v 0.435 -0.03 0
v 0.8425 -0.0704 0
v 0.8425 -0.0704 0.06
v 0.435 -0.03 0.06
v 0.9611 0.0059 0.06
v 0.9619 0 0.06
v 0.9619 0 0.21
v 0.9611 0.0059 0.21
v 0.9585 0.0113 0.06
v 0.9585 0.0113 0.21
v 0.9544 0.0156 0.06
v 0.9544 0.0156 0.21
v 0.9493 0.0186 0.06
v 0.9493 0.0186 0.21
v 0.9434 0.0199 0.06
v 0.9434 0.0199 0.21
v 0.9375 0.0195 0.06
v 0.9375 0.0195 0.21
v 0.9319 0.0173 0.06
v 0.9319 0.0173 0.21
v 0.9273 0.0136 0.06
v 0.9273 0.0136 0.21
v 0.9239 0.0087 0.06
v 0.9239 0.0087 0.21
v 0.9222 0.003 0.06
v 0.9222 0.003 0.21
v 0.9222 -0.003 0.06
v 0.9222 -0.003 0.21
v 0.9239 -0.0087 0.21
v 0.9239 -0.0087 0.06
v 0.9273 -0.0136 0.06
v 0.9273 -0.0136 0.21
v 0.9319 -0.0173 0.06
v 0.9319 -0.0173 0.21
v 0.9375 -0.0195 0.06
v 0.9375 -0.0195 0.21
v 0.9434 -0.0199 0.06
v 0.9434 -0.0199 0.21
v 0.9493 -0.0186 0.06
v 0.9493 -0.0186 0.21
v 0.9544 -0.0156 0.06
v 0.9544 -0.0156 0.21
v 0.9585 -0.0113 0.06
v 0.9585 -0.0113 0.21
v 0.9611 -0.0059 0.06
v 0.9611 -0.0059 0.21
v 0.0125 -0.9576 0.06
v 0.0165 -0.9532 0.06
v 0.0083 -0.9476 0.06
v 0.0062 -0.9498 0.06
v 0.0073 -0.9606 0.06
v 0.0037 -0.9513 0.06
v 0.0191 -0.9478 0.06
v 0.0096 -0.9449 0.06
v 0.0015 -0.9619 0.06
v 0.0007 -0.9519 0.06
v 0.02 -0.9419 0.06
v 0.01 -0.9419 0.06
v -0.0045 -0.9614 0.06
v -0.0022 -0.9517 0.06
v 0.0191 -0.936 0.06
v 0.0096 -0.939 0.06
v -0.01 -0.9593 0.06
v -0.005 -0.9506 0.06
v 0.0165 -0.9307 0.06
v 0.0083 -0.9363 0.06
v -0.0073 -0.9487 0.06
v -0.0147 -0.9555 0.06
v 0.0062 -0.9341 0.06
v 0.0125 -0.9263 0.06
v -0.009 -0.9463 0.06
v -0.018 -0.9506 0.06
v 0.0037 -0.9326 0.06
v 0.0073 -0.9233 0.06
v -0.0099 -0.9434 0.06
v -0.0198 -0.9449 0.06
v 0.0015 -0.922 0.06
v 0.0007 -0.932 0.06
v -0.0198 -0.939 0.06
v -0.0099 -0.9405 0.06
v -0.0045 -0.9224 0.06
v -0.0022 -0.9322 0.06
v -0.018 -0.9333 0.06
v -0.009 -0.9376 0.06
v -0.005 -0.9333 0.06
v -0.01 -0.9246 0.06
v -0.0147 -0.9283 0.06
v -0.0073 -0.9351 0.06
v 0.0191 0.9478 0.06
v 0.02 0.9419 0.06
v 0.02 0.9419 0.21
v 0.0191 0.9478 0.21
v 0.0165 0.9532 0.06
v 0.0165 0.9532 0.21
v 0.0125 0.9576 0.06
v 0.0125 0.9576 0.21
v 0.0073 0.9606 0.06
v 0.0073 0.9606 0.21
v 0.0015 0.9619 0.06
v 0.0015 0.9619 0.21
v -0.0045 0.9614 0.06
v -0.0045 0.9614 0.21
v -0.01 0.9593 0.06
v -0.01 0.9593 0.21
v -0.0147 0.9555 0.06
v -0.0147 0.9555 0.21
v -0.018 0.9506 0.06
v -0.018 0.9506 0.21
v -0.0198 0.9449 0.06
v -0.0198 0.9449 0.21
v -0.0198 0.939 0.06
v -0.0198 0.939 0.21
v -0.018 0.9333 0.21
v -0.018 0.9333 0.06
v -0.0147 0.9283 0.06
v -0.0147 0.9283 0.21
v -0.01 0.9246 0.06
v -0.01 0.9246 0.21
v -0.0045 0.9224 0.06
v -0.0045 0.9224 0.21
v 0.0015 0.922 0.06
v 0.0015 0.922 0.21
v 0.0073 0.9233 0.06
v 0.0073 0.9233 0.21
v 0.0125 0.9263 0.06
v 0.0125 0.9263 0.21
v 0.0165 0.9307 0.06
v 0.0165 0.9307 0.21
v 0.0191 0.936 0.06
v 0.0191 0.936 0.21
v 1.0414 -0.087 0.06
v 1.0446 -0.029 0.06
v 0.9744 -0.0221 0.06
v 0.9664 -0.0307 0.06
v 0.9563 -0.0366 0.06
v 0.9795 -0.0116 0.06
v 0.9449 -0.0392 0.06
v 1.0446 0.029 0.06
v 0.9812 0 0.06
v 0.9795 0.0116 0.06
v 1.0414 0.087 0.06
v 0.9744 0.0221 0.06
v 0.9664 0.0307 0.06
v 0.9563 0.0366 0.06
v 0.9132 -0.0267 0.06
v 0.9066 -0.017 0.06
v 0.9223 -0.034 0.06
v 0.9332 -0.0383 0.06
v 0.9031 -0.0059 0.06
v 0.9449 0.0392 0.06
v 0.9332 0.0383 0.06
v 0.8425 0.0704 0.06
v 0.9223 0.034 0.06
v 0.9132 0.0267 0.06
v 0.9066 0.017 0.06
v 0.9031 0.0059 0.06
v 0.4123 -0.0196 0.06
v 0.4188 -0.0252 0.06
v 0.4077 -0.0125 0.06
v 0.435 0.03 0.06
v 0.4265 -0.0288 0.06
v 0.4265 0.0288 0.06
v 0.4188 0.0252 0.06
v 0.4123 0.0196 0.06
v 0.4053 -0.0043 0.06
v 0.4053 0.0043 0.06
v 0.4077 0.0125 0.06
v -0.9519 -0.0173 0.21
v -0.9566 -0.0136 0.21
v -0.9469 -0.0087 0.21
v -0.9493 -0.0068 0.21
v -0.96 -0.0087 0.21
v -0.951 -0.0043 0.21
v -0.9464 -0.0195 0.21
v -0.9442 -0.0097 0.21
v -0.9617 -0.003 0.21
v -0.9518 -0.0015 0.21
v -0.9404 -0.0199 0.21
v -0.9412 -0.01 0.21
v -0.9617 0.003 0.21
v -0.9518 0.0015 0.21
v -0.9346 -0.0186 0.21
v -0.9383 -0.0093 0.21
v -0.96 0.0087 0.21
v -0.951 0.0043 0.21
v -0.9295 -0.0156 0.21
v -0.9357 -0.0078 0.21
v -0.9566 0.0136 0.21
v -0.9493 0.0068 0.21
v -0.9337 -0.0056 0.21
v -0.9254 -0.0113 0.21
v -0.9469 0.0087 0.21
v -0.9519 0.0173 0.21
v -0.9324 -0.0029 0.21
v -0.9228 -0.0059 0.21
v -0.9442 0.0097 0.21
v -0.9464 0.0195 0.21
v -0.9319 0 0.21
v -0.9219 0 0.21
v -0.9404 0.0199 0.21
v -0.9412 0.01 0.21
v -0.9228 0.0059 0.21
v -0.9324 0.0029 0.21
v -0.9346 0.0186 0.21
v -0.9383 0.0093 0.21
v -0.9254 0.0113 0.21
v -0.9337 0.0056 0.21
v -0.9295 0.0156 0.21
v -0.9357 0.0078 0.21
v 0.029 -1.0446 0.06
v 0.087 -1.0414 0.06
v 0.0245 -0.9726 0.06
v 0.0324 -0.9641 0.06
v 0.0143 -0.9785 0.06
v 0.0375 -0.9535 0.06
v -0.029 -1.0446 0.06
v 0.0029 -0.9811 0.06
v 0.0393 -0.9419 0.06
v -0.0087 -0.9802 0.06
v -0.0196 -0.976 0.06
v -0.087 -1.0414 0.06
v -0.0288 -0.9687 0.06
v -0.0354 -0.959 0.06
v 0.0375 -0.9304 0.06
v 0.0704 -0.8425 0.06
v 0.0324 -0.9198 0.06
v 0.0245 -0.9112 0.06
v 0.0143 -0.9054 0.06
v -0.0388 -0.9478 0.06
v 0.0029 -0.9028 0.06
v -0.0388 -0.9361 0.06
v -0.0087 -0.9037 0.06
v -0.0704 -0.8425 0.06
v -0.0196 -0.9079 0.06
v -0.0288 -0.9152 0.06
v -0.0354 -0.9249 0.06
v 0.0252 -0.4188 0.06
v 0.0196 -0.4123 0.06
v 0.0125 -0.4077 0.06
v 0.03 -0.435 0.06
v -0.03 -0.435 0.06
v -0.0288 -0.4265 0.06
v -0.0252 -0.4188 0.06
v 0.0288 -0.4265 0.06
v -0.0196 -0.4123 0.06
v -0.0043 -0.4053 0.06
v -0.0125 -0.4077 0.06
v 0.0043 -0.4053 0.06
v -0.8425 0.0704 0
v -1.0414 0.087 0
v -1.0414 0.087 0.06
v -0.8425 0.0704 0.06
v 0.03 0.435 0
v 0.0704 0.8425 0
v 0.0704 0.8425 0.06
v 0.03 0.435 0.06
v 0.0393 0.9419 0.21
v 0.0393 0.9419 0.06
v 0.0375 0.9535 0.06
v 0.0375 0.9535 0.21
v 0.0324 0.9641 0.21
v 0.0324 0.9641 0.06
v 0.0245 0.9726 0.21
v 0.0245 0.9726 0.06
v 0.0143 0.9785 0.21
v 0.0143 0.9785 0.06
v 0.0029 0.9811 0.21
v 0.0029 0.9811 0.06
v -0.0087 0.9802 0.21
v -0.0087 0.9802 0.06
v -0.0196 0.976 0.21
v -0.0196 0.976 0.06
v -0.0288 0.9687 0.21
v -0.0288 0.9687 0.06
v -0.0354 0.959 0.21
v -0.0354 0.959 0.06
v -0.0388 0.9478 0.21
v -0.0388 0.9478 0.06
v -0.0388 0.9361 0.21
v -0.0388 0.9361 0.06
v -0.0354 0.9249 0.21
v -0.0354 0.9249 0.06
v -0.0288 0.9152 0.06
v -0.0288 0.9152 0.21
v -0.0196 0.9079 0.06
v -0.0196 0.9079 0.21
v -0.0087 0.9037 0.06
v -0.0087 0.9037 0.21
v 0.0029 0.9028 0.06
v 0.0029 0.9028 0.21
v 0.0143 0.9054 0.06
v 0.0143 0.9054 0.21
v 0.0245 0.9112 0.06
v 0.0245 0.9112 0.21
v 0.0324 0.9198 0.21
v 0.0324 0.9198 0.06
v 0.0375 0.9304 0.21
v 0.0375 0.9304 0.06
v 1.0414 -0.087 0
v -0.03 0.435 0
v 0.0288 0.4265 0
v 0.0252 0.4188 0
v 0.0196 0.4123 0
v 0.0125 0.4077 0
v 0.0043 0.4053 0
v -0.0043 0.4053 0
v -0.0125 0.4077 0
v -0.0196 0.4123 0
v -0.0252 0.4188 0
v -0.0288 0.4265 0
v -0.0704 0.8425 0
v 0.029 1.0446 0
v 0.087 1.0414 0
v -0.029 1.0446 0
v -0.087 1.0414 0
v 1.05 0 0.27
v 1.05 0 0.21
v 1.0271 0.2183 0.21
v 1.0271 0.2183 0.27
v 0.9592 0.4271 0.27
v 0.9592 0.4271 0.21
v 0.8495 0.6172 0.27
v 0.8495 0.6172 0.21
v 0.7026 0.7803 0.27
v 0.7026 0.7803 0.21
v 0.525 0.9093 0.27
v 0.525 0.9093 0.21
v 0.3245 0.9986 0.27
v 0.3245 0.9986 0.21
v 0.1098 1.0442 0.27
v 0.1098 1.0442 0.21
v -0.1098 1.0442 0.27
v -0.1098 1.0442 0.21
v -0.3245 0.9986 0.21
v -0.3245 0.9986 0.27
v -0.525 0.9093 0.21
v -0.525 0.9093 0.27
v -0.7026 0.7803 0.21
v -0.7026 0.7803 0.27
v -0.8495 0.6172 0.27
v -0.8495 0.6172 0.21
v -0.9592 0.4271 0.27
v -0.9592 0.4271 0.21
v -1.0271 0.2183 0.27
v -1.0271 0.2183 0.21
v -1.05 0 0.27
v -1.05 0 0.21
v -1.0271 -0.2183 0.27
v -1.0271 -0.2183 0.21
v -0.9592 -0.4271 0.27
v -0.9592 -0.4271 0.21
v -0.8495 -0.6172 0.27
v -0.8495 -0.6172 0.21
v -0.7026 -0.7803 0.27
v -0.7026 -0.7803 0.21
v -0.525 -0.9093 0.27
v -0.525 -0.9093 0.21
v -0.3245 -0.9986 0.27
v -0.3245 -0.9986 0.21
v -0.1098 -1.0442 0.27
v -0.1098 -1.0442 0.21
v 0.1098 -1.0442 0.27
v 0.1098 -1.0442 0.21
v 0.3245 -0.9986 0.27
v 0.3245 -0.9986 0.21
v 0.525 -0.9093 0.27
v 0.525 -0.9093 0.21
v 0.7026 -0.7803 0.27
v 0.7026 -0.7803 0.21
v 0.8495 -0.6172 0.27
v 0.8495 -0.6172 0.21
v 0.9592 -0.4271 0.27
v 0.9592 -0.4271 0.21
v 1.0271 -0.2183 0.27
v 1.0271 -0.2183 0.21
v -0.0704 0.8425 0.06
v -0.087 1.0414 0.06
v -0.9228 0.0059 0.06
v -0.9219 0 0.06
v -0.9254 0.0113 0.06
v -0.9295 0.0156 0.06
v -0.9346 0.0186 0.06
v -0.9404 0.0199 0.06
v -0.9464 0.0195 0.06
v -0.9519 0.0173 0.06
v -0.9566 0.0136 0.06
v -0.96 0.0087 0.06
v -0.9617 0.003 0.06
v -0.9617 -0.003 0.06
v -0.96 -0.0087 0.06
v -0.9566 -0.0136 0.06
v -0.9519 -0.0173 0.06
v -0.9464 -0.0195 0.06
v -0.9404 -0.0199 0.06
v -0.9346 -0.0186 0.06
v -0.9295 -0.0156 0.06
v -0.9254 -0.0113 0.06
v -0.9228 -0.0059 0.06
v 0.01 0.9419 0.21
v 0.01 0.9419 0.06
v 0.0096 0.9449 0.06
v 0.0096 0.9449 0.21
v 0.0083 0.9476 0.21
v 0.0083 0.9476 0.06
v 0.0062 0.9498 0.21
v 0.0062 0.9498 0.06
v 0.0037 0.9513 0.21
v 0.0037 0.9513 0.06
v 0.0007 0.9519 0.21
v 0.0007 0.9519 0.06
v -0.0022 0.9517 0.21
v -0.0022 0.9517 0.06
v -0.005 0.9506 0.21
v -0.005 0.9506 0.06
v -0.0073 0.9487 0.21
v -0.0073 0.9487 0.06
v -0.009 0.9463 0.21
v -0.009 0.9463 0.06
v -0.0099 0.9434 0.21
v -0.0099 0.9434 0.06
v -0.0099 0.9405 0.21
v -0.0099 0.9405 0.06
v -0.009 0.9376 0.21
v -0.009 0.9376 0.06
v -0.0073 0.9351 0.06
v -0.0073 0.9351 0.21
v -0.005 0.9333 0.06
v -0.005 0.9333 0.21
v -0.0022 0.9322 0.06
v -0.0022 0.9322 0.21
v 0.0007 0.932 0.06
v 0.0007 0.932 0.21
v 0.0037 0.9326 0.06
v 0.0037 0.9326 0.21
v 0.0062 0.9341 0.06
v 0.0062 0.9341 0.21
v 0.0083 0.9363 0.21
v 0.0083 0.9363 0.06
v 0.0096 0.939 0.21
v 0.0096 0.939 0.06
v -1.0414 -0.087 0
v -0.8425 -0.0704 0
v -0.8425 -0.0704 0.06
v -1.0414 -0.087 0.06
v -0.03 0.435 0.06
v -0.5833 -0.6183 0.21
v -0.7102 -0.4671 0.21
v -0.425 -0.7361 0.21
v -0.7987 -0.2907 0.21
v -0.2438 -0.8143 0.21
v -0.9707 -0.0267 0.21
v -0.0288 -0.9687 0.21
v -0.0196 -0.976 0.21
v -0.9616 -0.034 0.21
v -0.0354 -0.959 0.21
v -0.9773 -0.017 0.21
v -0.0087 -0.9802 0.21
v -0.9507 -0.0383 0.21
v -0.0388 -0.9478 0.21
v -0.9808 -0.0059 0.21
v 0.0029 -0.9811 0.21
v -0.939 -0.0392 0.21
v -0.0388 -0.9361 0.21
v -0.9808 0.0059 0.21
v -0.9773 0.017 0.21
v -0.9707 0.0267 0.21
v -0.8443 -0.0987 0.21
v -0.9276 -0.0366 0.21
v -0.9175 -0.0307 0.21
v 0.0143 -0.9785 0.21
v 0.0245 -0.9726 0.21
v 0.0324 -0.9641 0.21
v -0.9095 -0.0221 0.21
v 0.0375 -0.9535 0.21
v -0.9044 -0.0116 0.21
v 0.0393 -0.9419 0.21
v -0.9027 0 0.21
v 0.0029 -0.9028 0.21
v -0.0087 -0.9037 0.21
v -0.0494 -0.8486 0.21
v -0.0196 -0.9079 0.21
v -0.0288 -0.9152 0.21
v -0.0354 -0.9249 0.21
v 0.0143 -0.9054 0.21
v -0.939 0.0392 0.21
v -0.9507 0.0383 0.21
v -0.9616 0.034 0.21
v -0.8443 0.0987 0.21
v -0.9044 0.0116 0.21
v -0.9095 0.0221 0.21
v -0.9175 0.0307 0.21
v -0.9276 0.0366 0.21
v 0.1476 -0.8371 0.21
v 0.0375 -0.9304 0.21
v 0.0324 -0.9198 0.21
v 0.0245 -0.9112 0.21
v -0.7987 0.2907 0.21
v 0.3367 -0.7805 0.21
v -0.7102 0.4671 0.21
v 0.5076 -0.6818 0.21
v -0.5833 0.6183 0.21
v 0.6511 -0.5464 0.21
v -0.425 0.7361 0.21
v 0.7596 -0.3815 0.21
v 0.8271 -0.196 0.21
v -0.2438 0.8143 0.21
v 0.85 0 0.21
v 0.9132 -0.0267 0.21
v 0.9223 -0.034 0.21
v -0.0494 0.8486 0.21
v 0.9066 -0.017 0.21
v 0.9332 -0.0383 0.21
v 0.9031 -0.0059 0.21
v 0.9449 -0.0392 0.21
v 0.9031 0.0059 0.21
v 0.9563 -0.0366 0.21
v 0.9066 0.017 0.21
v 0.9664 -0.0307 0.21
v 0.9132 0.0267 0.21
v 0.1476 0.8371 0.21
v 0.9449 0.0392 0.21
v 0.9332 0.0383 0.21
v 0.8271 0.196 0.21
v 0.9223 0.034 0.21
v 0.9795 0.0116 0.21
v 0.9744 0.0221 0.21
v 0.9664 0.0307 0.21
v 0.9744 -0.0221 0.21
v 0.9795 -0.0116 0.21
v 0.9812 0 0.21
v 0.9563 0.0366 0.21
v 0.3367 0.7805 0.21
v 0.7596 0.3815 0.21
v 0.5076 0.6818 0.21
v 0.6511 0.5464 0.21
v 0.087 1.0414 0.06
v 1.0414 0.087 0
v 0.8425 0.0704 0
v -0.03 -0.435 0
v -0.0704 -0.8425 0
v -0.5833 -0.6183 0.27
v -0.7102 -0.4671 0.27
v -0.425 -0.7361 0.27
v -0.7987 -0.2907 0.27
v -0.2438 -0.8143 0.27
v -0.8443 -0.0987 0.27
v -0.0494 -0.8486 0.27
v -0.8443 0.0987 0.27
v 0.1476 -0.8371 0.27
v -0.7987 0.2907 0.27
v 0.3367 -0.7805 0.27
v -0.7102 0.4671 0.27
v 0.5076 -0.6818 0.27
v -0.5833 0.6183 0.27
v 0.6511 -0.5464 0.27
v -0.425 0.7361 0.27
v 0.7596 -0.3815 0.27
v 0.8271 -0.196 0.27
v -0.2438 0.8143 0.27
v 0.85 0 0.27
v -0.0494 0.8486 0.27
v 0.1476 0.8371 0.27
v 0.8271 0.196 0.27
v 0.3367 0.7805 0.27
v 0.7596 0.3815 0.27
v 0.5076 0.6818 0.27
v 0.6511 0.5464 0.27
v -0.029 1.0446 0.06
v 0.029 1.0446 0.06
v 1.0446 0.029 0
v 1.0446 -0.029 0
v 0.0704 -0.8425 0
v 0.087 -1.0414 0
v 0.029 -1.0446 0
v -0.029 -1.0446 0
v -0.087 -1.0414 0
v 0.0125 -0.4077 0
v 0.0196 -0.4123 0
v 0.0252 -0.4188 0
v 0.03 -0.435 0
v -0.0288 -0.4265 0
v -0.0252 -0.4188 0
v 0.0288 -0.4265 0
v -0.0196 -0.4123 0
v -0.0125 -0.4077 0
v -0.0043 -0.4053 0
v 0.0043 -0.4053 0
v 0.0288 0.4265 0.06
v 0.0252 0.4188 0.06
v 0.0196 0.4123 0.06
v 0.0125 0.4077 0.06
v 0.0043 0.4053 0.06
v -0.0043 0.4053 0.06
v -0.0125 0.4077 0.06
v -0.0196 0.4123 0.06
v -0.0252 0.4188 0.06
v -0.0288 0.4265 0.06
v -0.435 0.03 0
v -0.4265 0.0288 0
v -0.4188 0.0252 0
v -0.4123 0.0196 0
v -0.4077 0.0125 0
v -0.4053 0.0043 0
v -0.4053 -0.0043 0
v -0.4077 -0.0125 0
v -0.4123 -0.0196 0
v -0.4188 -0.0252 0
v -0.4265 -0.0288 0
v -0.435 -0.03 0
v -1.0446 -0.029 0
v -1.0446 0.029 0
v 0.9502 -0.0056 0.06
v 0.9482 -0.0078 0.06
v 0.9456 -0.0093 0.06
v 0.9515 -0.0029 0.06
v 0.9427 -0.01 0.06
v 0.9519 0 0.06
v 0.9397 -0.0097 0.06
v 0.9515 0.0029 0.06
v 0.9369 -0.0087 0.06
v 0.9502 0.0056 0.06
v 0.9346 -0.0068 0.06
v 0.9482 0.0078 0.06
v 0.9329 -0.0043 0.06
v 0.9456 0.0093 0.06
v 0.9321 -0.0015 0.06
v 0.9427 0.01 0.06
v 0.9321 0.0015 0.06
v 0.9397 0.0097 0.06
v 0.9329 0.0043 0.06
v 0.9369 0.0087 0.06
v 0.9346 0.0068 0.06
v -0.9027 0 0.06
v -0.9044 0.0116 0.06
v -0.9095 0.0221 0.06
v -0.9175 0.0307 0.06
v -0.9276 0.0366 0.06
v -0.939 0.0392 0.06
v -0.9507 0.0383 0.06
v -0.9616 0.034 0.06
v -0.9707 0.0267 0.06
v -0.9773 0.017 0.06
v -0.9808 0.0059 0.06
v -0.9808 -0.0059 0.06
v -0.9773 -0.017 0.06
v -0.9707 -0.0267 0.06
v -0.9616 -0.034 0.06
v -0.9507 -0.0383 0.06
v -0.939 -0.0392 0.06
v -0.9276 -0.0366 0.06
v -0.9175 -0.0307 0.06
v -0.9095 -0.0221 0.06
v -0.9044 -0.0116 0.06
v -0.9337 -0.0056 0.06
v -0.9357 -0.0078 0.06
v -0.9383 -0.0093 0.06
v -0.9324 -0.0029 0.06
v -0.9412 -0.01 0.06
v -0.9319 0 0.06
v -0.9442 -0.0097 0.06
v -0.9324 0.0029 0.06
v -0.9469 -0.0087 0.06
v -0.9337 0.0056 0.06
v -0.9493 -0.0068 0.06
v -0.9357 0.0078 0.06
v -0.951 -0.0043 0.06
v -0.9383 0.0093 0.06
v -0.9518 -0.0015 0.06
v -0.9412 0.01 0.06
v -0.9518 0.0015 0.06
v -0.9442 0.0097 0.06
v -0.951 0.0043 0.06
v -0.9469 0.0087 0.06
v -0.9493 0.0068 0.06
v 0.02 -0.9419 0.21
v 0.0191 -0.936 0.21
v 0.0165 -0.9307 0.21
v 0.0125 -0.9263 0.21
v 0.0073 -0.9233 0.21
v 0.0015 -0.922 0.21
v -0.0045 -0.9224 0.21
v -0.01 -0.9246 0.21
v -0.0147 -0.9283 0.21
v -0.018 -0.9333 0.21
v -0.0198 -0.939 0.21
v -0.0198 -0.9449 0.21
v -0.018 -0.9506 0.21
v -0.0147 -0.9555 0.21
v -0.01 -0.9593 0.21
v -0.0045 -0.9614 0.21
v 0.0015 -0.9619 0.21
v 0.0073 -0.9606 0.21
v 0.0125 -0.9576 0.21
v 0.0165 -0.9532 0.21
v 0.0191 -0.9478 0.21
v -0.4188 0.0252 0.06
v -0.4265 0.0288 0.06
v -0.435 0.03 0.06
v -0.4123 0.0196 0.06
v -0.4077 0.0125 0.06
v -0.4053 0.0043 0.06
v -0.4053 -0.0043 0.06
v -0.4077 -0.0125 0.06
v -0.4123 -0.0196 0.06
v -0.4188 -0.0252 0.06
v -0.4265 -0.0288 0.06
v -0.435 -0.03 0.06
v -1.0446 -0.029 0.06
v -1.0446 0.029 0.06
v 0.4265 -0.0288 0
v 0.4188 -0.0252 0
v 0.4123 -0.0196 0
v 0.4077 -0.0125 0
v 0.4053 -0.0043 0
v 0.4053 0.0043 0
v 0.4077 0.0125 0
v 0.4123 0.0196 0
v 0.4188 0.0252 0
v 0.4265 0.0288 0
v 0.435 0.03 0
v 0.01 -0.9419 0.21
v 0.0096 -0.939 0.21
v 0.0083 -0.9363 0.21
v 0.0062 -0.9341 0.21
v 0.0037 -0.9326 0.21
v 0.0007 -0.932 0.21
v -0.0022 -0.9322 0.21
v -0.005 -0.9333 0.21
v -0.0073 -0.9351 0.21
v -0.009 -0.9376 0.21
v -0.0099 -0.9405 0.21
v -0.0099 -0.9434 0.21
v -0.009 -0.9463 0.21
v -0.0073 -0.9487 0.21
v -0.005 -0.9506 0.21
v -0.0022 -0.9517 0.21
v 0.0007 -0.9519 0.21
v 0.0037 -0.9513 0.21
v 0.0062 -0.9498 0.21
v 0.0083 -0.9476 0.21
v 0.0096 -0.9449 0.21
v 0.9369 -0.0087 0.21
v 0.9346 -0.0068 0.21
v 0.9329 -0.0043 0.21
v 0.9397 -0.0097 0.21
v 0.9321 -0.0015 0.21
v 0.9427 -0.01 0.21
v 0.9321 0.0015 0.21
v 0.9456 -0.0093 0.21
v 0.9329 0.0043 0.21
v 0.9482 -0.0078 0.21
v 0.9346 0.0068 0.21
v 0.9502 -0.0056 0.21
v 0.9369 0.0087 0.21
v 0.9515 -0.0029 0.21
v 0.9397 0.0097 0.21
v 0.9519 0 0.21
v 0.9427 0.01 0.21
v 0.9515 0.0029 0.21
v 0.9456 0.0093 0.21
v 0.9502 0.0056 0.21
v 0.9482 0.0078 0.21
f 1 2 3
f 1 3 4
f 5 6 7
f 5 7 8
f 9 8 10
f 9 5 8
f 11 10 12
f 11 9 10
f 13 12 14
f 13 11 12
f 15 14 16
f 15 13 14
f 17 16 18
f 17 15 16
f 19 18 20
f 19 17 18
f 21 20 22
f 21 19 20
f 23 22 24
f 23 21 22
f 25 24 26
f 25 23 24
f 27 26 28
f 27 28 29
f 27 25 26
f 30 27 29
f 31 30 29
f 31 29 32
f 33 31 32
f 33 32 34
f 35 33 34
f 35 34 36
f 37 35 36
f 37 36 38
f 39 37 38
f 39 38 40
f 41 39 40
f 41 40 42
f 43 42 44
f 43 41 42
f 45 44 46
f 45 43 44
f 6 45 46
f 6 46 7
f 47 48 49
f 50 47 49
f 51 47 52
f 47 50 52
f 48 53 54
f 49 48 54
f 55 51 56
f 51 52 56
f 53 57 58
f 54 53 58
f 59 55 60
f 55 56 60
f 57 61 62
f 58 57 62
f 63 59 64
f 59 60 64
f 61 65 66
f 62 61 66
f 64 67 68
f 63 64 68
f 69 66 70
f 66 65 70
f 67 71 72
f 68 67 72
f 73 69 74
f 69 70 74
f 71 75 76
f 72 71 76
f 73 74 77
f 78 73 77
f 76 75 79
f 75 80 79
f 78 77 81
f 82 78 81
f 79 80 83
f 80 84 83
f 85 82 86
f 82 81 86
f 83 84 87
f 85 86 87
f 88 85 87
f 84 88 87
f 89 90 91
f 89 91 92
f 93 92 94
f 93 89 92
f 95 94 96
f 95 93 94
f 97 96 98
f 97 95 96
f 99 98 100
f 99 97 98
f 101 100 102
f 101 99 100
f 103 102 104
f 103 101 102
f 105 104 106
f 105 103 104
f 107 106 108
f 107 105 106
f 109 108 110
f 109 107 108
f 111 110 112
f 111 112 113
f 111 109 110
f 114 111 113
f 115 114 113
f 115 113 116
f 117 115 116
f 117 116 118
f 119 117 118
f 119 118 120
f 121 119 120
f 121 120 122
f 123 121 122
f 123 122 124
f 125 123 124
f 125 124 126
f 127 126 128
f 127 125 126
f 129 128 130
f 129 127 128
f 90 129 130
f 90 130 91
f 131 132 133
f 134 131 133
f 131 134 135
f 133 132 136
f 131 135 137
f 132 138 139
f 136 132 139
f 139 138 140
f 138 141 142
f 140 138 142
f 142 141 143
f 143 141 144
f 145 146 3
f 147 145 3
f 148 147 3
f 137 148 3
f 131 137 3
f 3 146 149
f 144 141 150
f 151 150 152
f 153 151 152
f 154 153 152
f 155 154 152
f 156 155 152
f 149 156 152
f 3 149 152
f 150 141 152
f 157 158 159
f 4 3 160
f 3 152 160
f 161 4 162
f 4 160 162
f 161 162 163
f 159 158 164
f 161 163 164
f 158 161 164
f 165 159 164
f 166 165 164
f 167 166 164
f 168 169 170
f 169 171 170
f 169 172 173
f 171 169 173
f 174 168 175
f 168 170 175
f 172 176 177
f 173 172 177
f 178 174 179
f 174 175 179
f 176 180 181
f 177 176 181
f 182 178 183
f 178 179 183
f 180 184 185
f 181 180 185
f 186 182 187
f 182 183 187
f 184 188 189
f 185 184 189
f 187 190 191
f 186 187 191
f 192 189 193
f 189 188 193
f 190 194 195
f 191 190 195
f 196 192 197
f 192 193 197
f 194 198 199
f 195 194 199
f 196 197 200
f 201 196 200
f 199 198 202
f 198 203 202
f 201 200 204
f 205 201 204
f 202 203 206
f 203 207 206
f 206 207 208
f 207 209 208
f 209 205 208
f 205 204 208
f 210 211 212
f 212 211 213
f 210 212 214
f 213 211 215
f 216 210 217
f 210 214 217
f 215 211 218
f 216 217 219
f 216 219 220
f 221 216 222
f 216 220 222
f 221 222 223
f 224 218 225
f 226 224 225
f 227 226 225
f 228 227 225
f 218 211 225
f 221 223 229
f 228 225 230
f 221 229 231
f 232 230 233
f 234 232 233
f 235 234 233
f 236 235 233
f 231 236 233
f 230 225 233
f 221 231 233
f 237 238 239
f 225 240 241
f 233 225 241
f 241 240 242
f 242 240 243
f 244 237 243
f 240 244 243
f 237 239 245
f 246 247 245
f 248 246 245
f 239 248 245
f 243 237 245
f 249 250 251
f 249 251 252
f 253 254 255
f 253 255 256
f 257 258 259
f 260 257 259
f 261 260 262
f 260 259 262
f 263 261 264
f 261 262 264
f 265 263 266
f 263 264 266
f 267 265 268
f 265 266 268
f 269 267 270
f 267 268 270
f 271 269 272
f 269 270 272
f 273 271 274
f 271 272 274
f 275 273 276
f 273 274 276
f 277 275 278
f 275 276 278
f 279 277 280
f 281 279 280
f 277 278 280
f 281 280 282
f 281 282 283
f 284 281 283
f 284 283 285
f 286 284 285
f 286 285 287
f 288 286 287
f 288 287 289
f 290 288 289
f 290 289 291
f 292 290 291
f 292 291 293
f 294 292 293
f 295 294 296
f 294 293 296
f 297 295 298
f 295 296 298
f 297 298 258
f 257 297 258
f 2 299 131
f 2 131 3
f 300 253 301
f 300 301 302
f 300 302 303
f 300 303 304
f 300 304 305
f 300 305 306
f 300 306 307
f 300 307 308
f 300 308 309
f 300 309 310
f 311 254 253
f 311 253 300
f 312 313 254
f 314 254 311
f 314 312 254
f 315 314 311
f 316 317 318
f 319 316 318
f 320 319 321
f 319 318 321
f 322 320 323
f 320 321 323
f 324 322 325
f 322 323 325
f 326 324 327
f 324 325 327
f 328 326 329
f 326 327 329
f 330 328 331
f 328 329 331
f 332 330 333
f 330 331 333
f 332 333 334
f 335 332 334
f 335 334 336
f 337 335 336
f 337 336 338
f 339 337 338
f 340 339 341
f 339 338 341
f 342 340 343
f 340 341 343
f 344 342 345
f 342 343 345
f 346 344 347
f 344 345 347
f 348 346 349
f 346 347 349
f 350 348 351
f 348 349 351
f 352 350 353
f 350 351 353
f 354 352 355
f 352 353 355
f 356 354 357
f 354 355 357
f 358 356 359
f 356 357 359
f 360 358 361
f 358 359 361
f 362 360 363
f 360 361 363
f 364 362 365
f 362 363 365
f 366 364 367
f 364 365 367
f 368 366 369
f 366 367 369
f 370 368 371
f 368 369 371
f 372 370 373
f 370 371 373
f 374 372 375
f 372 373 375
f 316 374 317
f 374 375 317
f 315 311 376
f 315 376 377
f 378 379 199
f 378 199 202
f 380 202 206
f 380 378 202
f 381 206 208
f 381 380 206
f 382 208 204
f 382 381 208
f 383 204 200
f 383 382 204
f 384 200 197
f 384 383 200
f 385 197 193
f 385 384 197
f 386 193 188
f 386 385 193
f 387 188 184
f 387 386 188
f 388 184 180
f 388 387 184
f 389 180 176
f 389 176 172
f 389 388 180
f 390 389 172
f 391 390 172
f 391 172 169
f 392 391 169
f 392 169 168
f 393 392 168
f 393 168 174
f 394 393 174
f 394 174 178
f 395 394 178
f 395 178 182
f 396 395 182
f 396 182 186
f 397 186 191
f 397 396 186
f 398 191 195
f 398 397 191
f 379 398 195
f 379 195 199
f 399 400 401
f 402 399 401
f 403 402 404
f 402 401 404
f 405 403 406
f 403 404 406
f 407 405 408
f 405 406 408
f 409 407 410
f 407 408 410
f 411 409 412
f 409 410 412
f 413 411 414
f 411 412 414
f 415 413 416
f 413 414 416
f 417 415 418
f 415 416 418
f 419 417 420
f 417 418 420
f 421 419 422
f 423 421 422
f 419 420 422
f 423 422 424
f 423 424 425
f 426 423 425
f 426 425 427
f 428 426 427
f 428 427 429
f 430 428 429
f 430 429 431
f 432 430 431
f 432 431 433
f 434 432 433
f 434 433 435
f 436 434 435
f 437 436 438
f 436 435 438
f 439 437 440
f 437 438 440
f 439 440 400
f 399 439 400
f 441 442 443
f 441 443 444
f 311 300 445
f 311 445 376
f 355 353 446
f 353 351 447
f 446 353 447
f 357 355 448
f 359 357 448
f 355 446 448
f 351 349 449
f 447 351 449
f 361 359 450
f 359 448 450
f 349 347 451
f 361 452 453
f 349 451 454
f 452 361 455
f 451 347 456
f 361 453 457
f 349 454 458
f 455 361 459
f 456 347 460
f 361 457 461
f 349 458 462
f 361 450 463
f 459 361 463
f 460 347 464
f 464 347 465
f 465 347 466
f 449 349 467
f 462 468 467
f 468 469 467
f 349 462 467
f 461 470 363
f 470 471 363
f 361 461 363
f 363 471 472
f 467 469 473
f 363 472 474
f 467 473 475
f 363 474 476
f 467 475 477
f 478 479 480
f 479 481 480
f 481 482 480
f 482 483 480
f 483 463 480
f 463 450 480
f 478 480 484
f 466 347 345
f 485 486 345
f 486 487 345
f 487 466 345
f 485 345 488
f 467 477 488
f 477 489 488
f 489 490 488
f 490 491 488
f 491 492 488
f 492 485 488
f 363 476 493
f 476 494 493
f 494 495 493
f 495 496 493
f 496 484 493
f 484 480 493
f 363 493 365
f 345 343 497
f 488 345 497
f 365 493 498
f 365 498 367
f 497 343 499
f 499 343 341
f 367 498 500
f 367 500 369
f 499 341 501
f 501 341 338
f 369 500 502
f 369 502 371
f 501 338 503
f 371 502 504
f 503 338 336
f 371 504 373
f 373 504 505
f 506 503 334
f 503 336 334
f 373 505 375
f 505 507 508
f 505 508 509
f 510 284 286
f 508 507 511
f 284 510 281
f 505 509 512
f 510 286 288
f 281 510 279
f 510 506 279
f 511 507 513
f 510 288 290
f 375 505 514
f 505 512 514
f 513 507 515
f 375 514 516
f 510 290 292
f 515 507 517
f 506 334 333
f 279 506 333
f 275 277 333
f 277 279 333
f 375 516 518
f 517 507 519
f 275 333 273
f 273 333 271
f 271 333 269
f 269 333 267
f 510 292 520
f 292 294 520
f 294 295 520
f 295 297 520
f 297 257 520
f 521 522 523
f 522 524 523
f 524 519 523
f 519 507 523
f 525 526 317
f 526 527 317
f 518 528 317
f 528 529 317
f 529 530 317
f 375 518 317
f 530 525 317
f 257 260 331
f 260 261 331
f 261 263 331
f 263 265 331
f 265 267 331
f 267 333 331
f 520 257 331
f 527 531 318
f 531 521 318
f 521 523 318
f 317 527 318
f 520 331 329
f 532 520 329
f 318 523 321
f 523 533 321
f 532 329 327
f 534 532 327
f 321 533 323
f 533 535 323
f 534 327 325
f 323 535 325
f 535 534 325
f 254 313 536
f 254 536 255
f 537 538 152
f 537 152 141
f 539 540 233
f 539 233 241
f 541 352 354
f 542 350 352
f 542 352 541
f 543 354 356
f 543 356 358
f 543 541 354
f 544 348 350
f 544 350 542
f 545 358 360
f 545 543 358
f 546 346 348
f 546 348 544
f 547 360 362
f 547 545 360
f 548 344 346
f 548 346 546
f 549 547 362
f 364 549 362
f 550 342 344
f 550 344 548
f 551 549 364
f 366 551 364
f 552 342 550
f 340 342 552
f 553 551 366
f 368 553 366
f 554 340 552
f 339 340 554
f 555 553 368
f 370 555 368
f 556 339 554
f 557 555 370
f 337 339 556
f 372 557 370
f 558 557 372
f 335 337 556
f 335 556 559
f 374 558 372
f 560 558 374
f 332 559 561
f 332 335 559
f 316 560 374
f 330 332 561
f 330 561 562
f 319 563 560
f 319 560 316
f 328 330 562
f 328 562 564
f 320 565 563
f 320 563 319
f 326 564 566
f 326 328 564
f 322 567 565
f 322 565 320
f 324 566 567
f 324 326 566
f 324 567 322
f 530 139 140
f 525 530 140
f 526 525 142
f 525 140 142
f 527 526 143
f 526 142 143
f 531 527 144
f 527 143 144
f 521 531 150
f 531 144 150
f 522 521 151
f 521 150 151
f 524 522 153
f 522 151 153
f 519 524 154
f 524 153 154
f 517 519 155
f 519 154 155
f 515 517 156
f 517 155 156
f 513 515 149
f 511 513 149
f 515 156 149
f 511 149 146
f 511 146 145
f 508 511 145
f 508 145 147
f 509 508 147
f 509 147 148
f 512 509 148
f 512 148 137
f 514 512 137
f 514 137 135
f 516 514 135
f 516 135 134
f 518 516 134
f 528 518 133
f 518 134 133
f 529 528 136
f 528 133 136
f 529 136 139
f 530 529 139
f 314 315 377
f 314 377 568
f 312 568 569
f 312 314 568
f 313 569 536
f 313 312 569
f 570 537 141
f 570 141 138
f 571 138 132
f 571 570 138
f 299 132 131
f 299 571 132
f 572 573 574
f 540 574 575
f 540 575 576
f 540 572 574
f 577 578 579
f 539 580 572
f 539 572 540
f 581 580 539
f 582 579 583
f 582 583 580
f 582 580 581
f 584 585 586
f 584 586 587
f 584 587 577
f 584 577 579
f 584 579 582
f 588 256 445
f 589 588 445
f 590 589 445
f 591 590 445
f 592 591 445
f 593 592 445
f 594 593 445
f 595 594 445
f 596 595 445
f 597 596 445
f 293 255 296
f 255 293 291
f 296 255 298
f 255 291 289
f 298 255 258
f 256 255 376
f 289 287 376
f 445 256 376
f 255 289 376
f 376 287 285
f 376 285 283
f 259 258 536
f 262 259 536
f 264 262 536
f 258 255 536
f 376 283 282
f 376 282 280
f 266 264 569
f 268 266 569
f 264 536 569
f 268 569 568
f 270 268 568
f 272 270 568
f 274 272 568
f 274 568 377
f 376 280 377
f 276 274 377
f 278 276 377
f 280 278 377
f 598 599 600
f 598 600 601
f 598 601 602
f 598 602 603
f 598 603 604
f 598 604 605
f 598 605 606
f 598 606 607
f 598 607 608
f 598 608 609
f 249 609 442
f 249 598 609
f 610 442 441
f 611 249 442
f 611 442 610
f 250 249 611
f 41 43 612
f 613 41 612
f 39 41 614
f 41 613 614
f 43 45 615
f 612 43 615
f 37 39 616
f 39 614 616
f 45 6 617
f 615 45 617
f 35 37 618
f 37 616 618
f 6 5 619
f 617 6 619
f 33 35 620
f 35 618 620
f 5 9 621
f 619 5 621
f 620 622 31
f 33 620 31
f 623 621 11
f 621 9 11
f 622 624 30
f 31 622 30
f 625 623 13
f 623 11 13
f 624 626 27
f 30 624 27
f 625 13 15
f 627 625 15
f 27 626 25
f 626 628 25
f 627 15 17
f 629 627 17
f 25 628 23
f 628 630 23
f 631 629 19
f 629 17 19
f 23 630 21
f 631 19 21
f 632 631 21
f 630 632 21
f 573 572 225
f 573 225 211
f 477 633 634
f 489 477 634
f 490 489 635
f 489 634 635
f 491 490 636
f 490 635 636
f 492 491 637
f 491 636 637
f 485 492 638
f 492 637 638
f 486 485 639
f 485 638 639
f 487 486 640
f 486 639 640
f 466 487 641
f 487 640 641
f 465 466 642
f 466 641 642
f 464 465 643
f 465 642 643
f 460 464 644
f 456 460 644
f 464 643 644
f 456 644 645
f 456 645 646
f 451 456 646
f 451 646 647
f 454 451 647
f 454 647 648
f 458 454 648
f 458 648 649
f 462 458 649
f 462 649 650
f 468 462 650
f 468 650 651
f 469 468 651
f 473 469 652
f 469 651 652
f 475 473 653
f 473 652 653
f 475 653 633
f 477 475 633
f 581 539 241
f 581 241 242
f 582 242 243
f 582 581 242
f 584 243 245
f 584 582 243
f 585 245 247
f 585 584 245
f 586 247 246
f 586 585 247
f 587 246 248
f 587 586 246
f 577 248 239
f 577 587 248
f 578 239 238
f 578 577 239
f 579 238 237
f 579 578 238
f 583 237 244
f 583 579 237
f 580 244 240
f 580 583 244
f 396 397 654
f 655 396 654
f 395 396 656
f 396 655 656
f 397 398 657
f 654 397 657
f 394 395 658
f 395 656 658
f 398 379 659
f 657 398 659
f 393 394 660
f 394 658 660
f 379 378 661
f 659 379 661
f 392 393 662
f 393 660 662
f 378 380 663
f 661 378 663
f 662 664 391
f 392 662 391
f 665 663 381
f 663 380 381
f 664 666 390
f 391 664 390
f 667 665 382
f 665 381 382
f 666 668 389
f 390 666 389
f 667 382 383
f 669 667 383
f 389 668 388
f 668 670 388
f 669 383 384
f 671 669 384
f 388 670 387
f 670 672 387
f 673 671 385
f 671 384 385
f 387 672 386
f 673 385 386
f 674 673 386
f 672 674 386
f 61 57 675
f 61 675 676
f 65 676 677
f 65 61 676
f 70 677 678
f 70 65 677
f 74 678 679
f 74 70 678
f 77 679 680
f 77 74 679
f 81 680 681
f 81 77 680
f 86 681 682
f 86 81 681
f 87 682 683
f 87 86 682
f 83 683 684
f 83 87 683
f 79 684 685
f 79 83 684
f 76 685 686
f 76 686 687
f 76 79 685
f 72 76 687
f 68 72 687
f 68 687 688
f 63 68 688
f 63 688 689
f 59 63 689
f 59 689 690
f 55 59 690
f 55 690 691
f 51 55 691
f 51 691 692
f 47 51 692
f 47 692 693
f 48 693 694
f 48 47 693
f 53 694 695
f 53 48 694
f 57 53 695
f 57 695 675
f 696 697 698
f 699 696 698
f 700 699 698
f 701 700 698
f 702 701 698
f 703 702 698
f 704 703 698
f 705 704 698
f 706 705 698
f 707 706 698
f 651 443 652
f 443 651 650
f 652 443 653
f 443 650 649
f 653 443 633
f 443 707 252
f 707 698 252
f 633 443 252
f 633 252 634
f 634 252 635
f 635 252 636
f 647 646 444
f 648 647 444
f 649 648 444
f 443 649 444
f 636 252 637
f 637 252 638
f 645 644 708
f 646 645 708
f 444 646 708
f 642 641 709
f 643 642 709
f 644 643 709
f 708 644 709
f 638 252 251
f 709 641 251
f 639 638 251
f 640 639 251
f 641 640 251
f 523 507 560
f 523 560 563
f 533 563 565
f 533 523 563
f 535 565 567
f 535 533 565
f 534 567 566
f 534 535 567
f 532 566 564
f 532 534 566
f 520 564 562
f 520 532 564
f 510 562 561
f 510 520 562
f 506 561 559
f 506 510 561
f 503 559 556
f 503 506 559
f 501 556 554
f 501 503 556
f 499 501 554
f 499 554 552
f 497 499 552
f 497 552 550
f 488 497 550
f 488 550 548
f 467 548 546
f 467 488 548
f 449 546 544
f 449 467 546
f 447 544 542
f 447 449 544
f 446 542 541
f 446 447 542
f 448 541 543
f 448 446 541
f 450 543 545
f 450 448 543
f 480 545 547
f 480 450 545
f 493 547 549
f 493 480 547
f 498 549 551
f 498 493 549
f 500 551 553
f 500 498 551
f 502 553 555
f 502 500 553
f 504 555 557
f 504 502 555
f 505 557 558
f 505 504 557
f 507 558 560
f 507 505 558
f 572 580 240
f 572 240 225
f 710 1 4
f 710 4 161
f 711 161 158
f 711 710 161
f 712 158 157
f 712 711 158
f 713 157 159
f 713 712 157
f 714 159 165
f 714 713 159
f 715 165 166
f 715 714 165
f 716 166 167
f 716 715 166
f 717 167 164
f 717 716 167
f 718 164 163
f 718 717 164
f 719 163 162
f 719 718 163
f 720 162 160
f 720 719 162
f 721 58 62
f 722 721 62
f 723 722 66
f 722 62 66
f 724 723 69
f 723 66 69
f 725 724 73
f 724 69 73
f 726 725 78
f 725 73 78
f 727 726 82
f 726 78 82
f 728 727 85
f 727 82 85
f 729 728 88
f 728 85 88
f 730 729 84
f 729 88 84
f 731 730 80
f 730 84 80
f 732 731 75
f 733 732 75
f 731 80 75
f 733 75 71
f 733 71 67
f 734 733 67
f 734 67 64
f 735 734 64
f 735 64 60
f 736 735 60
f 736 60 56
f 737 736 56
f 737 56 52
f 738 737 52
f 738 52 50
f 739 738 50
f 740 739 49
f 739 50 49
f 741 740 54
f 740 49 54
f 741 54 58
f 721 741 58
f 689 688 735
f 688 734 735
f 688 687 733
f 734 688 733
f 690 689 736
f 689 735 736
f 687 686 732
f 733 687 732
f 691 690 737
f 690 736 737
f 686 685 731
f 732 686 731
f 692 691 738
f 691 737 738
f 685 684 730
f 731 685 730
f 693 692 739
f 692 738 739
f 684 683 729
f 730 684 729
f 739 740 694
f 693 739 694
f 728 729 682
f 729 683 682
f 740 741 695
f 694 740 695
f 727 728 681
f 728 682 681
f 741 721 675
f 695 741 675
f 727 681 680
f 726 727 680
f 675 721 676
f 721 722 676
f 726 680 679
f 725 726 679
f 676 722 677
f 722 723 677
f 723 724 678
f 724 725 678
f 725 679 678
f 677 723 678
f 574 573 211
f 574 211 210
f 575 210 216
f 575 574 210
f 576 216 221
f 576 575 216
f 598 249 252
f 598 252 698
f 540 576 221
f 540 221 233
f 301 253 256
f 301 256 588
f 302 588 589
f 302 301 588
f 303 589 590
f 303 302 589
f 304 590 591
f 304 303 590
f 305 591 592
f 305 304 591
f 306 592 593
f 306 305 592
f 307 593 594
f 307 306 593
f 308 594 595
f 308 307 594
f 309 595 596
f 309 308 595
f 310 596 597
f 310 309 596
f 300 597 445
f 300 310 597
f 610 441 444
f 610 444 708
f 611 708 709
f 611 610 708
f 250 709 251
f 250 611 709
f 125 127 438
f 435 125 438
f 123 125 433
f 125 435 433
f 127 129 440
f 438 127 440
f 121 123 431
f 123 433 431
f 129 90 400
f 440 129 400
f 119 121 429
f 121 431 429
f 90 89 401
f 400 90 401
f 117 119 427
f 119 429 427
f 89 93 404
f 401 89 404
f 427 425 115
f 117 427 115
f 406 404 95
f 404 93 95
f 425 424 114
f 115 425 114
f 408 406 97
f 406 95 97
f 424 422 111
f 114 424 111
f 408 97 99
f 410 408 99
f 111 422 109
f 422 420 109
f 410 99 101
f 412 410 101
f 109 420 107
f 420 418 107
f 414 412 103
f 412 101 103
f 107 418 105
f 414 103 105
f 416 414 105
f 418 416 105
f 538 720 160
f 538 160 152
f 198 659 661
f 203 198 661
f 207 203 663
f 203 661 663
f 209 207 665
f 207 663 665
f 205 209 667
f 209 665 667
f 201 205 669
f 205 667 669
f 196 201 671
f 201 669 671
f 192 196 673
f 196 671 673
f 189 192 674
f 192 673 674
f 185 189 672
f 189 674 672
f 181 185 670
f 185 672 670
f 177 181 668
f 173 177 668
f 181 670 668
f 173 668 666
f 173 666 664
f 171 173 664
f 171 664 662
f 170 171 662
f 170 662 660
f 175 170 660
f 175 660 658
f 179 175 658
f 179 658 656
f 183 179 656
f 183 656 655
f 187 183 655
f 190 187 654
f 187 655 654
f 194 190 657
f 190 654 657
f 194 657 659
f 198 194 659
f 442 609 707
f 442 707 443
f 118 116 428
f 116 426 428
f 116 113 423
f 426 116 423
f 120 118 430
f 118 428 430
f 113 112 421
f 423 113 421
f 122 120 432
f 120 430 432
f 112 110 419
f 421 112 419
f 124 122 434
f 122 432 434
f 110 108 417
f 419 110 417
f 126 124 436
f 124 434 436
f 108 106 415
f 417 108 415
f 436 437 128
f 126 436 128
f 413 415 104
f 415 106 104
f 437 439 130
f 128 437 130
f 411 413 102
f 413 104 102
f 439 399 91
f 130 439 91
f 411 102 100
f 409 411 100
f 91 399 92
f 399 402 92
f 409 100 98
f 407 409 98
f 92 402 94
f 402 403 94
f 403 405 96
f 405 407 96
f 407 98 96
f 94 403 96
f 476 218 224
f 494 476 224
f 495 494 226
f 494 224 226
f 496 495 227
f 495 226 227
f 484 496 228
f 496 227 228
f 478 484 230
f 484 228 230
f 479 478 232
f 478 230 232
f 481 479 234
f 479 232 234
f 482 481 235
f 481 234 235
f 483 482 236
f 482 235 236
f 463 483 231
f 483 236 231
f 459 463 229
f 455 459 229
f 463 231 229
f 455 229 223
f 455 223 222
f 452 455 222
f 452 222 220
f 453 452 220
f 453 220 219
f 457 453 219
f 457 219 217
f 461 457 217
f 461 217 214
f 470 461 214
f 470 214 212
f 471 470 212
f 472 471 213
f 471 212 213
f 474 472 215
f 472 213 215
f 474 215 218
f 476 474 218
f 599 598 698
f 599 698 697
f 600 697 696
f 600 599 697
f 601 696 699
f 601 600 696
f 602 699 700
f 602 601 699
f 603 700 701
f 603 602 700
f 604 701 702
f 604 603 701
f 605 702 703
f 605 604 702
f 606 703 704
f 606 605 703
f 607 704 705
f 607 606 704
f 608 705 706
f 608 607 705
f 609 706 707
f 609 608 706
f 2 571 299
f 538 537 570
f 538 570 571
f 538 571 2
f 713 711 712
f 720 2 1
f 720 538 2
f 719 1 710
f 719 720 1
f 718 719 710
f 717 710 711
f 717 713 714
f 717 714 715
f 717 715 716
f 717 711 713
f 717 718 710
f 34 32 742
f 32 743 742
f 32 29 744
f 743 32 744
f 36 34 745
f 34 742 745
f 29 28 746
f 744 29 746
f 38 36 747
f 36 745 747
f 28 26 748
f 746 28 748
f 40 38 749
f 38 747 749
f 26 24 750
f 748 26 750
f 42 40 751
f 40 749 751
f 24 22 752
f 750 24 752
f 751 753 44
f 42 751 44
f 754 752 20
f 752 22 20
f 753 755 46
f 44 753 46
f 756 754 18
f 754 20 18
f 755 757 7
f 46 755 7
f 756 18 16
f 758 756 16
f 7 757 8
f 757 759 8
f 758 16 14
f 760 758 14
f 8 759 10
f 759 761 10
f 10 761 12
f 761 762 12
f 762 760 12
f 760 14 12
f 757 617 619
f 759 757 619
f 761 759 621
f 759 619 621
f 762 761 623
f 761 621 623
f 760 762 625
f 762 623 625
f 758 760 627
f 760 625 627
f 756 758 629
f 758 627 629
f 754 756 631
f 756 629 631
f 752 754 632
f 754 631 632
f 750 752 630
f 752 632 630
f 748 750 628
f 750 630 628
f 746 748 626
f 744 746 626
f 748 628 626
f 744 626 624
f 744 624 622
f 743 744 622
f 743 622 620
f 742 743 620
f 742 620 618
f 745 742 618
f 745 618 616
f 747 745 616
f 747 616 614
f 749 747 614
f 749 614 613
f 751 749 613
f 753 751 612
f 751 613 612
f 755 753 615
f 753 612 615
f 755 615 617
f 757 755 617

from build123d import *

# Parameters (mm, degrees)
EXTRUDE_1_DEPTH   = 0.06
EXTRUDE_1_2_DEPTH = 0.06
EXTRUDE_1_3_DEPTH = 0.06
EXTRUDE_1_4_DEPTH = 0.06
SKETCH_2_R        = 0.01
EXTRUDE_2_DEPTH   = 0.15
SKETCH_3_R        = 1.05
SKETCH_3_R_2      = 0.85
EXTRUDE_3_DEPTH   = 0.06
SKETCH_6_R        = 0.039268628
SKETCH_6_R_2      = 0.02
EXTRUDE_4_DEPTH   = 0.15


with BuildPart() as part:
    # 草圖1 → 填料-伸長1 (new body)
    with BuildSketch(Plane.XY):
        with BuildLine():
            Line((-0.03, 0.435), (-0.070388149, 0.842515581))
            Line((-0.070388149, 0.842515581), (-0.087001654, 1.041372033))
            ThreePointArc((-0.087001654, 1.041372033), (0, 1.045), (0.087001654, 1.041372033))
            Line((0.087001654, 1.041372033), (0.070388149, 0.842515581))
            Line((0.070388149, 0.842515581), (0.03, 0.435))
            ThreePointArc((0.03, 0.435), (0, 0.405), (-0.03, 0.435))
        make_face()
    extrude(amount=EXTRUDE_1_DEPTH)



with BuildPart() as body_2:
    # 草圖1 → Extrude 1 2 (new body)
    with BuildSketch(Plane.XY):
        with BuildLine():
            Line((0.435, 0.03), (0.842515581, 0.070388149))
            Line((0.842515581, 0.070388149), (1.041372033, 0.087001654))
            ThreePointArc((1.041372033, 0.087001654), (1.045, 0), (1.041372033, -0.087001654))
            Line((1.041372033, -0.087001654), (0.842515581, -0.070388149))
            Line((0.842515581, -0.070388149), (0.435, -0.03))
            ThreePointArc((0.435, -0.03), (0.405, 0), (0.435, 0.03))
        make_face()
    extrude(amount=EXTRUDE_1_2_DEPTH)


with BuildPart() as body_3:
    # 草圖1 → Extrude 1 3 (new body)
    with BuildSketch(Plane.XY):
        with BuildLine():
            Line((0.03, -0.435), (0.070388149, -0.842515581))
            Line((0.070388149, -0.842515581), (0.087001654, -1.041372033))
            ThreePointArc((0.087001654, -1.041372033), (0, -1.045), (-0.087001654, -1.041372033))
            Line((-0.087001654, -1.041372033), (-0.070388149, -0.842515581))
            Line((-0.070388149, -0.842515581), (-0.03, -0.435))
            ThreePointArc((-0.03, -0.435), (0, -0.405), (0.03, -0.435))
        make_face()
    extrude(amount=EXTRUDE_1_3_DEPTH)


with BuildPart() as body_4:
    # 草圖1 → Extrude 1 4 (new body)
    with BuildSketch(Plane.XY):
        with BuildLine():
            Line((-0.435, -0.03), (-0.842515581, -0.070388149))
            Line((-0.842515581, -0.070388149), (-1.041372033, -0.087001654))
            ThreePointArc((-1.041372033, -0.087001654), (-1.045, 0), (-1.041372033, 0.087001654))
            Line((-1.041372033, 0.087001654), (-0.842515581, 0.070388149))
            Line((-0.842515581, 0.070388149), (-0.435, 0.03))
            ThreePointArc((-0.435, 0.03), (-0.405, 0), (-0.435, -0.03))
        make_face()
    extrude(amount=EXTRUDE_1_4_DEPTH)


with BuildPart() as part_1:
    add(part.part)

    add(body_2.part)  # 填料-伸長2 merges body 2

    add(body_3.part)  # 填料-伸長2 merges body 3

    add(body_4.part)  # 填料-伸長2 merges body 4
    # 草圖2 → 填料-伸長2 (add)
    with BuildSketch(Plane.XY.offset(0.06)):
        with Locations((0.941943807, 0)):
            Circle(SKETCH_2_R)
        with Locations((0, 0.941943807)):
            Circle(SKETCH_2_R)
        with Locations((-0.941943807, 0)):
            Circle(SKETCH_2_R)
        with Locations((0, -0.941943807)):
            Circle(SKETCH_2_R)
    extrude(amount=EXTRUDE_2_DEPTH)

    # 草圖3 → 填料-伸長3 (add)
    with BuildSketch(Plane.XY.offset(0.21)):
        Circle(SKETCH_3_R)
        Circle(SKETCH_3_R_2, mode=Mode.SUBTRACT)
    extrude(amount=EXTRUDE_3_DEPTH)

    # 草圖6 → 填料-伸長4 (add)
    # profile 1 of 4: a face of its own
    with BuildSketch(Plane.XY.offset(0.06)):
        with Locations((0.941943807, 0)):
            Circle(SKETCH_6_R)
        with Locations((0.941943807, 0)):
            Circle(SKETCH_6_R_2, mode=Mode.SUBTRACT)
    # profile 2 of 4: a face of its own
    with BuildSketch(Plane.XY.offset(0.06)):
        with Locations((0, -0.941943807)):
            Circle(SKETCH_6_R)
        with Locations((0, -0.941943807)):
            Circle(SKETCH_6_R_2, mode=Mode.SUBTRACT)
    # profile 3 of 4: a face of its own
    with BuildSketch(Plane.XY.offset(0.06)):
        with Locations((-0.941943807, 0)):
            Circle(SKETCH_6_R)
        with Locations((-0.941943807, 0)):
            Circle(SKETCH_6_R_2, mode=Mode.SUBTRACT)
    # profile 4 of 4: a face of its own
    with BuildSketch(Plane.XY.offset(0.06)):
        with Locations((0, 0.941943807)):
            Circle(SKETCH_6_R)
        with Locations((0, 0.941943807)):
            Circle(SKETCH_6_R_2, mode=Mode.SUBTRACT)
    extrude(amount=EXTRUDE_4_DEPTH)


solid = part_1.part
